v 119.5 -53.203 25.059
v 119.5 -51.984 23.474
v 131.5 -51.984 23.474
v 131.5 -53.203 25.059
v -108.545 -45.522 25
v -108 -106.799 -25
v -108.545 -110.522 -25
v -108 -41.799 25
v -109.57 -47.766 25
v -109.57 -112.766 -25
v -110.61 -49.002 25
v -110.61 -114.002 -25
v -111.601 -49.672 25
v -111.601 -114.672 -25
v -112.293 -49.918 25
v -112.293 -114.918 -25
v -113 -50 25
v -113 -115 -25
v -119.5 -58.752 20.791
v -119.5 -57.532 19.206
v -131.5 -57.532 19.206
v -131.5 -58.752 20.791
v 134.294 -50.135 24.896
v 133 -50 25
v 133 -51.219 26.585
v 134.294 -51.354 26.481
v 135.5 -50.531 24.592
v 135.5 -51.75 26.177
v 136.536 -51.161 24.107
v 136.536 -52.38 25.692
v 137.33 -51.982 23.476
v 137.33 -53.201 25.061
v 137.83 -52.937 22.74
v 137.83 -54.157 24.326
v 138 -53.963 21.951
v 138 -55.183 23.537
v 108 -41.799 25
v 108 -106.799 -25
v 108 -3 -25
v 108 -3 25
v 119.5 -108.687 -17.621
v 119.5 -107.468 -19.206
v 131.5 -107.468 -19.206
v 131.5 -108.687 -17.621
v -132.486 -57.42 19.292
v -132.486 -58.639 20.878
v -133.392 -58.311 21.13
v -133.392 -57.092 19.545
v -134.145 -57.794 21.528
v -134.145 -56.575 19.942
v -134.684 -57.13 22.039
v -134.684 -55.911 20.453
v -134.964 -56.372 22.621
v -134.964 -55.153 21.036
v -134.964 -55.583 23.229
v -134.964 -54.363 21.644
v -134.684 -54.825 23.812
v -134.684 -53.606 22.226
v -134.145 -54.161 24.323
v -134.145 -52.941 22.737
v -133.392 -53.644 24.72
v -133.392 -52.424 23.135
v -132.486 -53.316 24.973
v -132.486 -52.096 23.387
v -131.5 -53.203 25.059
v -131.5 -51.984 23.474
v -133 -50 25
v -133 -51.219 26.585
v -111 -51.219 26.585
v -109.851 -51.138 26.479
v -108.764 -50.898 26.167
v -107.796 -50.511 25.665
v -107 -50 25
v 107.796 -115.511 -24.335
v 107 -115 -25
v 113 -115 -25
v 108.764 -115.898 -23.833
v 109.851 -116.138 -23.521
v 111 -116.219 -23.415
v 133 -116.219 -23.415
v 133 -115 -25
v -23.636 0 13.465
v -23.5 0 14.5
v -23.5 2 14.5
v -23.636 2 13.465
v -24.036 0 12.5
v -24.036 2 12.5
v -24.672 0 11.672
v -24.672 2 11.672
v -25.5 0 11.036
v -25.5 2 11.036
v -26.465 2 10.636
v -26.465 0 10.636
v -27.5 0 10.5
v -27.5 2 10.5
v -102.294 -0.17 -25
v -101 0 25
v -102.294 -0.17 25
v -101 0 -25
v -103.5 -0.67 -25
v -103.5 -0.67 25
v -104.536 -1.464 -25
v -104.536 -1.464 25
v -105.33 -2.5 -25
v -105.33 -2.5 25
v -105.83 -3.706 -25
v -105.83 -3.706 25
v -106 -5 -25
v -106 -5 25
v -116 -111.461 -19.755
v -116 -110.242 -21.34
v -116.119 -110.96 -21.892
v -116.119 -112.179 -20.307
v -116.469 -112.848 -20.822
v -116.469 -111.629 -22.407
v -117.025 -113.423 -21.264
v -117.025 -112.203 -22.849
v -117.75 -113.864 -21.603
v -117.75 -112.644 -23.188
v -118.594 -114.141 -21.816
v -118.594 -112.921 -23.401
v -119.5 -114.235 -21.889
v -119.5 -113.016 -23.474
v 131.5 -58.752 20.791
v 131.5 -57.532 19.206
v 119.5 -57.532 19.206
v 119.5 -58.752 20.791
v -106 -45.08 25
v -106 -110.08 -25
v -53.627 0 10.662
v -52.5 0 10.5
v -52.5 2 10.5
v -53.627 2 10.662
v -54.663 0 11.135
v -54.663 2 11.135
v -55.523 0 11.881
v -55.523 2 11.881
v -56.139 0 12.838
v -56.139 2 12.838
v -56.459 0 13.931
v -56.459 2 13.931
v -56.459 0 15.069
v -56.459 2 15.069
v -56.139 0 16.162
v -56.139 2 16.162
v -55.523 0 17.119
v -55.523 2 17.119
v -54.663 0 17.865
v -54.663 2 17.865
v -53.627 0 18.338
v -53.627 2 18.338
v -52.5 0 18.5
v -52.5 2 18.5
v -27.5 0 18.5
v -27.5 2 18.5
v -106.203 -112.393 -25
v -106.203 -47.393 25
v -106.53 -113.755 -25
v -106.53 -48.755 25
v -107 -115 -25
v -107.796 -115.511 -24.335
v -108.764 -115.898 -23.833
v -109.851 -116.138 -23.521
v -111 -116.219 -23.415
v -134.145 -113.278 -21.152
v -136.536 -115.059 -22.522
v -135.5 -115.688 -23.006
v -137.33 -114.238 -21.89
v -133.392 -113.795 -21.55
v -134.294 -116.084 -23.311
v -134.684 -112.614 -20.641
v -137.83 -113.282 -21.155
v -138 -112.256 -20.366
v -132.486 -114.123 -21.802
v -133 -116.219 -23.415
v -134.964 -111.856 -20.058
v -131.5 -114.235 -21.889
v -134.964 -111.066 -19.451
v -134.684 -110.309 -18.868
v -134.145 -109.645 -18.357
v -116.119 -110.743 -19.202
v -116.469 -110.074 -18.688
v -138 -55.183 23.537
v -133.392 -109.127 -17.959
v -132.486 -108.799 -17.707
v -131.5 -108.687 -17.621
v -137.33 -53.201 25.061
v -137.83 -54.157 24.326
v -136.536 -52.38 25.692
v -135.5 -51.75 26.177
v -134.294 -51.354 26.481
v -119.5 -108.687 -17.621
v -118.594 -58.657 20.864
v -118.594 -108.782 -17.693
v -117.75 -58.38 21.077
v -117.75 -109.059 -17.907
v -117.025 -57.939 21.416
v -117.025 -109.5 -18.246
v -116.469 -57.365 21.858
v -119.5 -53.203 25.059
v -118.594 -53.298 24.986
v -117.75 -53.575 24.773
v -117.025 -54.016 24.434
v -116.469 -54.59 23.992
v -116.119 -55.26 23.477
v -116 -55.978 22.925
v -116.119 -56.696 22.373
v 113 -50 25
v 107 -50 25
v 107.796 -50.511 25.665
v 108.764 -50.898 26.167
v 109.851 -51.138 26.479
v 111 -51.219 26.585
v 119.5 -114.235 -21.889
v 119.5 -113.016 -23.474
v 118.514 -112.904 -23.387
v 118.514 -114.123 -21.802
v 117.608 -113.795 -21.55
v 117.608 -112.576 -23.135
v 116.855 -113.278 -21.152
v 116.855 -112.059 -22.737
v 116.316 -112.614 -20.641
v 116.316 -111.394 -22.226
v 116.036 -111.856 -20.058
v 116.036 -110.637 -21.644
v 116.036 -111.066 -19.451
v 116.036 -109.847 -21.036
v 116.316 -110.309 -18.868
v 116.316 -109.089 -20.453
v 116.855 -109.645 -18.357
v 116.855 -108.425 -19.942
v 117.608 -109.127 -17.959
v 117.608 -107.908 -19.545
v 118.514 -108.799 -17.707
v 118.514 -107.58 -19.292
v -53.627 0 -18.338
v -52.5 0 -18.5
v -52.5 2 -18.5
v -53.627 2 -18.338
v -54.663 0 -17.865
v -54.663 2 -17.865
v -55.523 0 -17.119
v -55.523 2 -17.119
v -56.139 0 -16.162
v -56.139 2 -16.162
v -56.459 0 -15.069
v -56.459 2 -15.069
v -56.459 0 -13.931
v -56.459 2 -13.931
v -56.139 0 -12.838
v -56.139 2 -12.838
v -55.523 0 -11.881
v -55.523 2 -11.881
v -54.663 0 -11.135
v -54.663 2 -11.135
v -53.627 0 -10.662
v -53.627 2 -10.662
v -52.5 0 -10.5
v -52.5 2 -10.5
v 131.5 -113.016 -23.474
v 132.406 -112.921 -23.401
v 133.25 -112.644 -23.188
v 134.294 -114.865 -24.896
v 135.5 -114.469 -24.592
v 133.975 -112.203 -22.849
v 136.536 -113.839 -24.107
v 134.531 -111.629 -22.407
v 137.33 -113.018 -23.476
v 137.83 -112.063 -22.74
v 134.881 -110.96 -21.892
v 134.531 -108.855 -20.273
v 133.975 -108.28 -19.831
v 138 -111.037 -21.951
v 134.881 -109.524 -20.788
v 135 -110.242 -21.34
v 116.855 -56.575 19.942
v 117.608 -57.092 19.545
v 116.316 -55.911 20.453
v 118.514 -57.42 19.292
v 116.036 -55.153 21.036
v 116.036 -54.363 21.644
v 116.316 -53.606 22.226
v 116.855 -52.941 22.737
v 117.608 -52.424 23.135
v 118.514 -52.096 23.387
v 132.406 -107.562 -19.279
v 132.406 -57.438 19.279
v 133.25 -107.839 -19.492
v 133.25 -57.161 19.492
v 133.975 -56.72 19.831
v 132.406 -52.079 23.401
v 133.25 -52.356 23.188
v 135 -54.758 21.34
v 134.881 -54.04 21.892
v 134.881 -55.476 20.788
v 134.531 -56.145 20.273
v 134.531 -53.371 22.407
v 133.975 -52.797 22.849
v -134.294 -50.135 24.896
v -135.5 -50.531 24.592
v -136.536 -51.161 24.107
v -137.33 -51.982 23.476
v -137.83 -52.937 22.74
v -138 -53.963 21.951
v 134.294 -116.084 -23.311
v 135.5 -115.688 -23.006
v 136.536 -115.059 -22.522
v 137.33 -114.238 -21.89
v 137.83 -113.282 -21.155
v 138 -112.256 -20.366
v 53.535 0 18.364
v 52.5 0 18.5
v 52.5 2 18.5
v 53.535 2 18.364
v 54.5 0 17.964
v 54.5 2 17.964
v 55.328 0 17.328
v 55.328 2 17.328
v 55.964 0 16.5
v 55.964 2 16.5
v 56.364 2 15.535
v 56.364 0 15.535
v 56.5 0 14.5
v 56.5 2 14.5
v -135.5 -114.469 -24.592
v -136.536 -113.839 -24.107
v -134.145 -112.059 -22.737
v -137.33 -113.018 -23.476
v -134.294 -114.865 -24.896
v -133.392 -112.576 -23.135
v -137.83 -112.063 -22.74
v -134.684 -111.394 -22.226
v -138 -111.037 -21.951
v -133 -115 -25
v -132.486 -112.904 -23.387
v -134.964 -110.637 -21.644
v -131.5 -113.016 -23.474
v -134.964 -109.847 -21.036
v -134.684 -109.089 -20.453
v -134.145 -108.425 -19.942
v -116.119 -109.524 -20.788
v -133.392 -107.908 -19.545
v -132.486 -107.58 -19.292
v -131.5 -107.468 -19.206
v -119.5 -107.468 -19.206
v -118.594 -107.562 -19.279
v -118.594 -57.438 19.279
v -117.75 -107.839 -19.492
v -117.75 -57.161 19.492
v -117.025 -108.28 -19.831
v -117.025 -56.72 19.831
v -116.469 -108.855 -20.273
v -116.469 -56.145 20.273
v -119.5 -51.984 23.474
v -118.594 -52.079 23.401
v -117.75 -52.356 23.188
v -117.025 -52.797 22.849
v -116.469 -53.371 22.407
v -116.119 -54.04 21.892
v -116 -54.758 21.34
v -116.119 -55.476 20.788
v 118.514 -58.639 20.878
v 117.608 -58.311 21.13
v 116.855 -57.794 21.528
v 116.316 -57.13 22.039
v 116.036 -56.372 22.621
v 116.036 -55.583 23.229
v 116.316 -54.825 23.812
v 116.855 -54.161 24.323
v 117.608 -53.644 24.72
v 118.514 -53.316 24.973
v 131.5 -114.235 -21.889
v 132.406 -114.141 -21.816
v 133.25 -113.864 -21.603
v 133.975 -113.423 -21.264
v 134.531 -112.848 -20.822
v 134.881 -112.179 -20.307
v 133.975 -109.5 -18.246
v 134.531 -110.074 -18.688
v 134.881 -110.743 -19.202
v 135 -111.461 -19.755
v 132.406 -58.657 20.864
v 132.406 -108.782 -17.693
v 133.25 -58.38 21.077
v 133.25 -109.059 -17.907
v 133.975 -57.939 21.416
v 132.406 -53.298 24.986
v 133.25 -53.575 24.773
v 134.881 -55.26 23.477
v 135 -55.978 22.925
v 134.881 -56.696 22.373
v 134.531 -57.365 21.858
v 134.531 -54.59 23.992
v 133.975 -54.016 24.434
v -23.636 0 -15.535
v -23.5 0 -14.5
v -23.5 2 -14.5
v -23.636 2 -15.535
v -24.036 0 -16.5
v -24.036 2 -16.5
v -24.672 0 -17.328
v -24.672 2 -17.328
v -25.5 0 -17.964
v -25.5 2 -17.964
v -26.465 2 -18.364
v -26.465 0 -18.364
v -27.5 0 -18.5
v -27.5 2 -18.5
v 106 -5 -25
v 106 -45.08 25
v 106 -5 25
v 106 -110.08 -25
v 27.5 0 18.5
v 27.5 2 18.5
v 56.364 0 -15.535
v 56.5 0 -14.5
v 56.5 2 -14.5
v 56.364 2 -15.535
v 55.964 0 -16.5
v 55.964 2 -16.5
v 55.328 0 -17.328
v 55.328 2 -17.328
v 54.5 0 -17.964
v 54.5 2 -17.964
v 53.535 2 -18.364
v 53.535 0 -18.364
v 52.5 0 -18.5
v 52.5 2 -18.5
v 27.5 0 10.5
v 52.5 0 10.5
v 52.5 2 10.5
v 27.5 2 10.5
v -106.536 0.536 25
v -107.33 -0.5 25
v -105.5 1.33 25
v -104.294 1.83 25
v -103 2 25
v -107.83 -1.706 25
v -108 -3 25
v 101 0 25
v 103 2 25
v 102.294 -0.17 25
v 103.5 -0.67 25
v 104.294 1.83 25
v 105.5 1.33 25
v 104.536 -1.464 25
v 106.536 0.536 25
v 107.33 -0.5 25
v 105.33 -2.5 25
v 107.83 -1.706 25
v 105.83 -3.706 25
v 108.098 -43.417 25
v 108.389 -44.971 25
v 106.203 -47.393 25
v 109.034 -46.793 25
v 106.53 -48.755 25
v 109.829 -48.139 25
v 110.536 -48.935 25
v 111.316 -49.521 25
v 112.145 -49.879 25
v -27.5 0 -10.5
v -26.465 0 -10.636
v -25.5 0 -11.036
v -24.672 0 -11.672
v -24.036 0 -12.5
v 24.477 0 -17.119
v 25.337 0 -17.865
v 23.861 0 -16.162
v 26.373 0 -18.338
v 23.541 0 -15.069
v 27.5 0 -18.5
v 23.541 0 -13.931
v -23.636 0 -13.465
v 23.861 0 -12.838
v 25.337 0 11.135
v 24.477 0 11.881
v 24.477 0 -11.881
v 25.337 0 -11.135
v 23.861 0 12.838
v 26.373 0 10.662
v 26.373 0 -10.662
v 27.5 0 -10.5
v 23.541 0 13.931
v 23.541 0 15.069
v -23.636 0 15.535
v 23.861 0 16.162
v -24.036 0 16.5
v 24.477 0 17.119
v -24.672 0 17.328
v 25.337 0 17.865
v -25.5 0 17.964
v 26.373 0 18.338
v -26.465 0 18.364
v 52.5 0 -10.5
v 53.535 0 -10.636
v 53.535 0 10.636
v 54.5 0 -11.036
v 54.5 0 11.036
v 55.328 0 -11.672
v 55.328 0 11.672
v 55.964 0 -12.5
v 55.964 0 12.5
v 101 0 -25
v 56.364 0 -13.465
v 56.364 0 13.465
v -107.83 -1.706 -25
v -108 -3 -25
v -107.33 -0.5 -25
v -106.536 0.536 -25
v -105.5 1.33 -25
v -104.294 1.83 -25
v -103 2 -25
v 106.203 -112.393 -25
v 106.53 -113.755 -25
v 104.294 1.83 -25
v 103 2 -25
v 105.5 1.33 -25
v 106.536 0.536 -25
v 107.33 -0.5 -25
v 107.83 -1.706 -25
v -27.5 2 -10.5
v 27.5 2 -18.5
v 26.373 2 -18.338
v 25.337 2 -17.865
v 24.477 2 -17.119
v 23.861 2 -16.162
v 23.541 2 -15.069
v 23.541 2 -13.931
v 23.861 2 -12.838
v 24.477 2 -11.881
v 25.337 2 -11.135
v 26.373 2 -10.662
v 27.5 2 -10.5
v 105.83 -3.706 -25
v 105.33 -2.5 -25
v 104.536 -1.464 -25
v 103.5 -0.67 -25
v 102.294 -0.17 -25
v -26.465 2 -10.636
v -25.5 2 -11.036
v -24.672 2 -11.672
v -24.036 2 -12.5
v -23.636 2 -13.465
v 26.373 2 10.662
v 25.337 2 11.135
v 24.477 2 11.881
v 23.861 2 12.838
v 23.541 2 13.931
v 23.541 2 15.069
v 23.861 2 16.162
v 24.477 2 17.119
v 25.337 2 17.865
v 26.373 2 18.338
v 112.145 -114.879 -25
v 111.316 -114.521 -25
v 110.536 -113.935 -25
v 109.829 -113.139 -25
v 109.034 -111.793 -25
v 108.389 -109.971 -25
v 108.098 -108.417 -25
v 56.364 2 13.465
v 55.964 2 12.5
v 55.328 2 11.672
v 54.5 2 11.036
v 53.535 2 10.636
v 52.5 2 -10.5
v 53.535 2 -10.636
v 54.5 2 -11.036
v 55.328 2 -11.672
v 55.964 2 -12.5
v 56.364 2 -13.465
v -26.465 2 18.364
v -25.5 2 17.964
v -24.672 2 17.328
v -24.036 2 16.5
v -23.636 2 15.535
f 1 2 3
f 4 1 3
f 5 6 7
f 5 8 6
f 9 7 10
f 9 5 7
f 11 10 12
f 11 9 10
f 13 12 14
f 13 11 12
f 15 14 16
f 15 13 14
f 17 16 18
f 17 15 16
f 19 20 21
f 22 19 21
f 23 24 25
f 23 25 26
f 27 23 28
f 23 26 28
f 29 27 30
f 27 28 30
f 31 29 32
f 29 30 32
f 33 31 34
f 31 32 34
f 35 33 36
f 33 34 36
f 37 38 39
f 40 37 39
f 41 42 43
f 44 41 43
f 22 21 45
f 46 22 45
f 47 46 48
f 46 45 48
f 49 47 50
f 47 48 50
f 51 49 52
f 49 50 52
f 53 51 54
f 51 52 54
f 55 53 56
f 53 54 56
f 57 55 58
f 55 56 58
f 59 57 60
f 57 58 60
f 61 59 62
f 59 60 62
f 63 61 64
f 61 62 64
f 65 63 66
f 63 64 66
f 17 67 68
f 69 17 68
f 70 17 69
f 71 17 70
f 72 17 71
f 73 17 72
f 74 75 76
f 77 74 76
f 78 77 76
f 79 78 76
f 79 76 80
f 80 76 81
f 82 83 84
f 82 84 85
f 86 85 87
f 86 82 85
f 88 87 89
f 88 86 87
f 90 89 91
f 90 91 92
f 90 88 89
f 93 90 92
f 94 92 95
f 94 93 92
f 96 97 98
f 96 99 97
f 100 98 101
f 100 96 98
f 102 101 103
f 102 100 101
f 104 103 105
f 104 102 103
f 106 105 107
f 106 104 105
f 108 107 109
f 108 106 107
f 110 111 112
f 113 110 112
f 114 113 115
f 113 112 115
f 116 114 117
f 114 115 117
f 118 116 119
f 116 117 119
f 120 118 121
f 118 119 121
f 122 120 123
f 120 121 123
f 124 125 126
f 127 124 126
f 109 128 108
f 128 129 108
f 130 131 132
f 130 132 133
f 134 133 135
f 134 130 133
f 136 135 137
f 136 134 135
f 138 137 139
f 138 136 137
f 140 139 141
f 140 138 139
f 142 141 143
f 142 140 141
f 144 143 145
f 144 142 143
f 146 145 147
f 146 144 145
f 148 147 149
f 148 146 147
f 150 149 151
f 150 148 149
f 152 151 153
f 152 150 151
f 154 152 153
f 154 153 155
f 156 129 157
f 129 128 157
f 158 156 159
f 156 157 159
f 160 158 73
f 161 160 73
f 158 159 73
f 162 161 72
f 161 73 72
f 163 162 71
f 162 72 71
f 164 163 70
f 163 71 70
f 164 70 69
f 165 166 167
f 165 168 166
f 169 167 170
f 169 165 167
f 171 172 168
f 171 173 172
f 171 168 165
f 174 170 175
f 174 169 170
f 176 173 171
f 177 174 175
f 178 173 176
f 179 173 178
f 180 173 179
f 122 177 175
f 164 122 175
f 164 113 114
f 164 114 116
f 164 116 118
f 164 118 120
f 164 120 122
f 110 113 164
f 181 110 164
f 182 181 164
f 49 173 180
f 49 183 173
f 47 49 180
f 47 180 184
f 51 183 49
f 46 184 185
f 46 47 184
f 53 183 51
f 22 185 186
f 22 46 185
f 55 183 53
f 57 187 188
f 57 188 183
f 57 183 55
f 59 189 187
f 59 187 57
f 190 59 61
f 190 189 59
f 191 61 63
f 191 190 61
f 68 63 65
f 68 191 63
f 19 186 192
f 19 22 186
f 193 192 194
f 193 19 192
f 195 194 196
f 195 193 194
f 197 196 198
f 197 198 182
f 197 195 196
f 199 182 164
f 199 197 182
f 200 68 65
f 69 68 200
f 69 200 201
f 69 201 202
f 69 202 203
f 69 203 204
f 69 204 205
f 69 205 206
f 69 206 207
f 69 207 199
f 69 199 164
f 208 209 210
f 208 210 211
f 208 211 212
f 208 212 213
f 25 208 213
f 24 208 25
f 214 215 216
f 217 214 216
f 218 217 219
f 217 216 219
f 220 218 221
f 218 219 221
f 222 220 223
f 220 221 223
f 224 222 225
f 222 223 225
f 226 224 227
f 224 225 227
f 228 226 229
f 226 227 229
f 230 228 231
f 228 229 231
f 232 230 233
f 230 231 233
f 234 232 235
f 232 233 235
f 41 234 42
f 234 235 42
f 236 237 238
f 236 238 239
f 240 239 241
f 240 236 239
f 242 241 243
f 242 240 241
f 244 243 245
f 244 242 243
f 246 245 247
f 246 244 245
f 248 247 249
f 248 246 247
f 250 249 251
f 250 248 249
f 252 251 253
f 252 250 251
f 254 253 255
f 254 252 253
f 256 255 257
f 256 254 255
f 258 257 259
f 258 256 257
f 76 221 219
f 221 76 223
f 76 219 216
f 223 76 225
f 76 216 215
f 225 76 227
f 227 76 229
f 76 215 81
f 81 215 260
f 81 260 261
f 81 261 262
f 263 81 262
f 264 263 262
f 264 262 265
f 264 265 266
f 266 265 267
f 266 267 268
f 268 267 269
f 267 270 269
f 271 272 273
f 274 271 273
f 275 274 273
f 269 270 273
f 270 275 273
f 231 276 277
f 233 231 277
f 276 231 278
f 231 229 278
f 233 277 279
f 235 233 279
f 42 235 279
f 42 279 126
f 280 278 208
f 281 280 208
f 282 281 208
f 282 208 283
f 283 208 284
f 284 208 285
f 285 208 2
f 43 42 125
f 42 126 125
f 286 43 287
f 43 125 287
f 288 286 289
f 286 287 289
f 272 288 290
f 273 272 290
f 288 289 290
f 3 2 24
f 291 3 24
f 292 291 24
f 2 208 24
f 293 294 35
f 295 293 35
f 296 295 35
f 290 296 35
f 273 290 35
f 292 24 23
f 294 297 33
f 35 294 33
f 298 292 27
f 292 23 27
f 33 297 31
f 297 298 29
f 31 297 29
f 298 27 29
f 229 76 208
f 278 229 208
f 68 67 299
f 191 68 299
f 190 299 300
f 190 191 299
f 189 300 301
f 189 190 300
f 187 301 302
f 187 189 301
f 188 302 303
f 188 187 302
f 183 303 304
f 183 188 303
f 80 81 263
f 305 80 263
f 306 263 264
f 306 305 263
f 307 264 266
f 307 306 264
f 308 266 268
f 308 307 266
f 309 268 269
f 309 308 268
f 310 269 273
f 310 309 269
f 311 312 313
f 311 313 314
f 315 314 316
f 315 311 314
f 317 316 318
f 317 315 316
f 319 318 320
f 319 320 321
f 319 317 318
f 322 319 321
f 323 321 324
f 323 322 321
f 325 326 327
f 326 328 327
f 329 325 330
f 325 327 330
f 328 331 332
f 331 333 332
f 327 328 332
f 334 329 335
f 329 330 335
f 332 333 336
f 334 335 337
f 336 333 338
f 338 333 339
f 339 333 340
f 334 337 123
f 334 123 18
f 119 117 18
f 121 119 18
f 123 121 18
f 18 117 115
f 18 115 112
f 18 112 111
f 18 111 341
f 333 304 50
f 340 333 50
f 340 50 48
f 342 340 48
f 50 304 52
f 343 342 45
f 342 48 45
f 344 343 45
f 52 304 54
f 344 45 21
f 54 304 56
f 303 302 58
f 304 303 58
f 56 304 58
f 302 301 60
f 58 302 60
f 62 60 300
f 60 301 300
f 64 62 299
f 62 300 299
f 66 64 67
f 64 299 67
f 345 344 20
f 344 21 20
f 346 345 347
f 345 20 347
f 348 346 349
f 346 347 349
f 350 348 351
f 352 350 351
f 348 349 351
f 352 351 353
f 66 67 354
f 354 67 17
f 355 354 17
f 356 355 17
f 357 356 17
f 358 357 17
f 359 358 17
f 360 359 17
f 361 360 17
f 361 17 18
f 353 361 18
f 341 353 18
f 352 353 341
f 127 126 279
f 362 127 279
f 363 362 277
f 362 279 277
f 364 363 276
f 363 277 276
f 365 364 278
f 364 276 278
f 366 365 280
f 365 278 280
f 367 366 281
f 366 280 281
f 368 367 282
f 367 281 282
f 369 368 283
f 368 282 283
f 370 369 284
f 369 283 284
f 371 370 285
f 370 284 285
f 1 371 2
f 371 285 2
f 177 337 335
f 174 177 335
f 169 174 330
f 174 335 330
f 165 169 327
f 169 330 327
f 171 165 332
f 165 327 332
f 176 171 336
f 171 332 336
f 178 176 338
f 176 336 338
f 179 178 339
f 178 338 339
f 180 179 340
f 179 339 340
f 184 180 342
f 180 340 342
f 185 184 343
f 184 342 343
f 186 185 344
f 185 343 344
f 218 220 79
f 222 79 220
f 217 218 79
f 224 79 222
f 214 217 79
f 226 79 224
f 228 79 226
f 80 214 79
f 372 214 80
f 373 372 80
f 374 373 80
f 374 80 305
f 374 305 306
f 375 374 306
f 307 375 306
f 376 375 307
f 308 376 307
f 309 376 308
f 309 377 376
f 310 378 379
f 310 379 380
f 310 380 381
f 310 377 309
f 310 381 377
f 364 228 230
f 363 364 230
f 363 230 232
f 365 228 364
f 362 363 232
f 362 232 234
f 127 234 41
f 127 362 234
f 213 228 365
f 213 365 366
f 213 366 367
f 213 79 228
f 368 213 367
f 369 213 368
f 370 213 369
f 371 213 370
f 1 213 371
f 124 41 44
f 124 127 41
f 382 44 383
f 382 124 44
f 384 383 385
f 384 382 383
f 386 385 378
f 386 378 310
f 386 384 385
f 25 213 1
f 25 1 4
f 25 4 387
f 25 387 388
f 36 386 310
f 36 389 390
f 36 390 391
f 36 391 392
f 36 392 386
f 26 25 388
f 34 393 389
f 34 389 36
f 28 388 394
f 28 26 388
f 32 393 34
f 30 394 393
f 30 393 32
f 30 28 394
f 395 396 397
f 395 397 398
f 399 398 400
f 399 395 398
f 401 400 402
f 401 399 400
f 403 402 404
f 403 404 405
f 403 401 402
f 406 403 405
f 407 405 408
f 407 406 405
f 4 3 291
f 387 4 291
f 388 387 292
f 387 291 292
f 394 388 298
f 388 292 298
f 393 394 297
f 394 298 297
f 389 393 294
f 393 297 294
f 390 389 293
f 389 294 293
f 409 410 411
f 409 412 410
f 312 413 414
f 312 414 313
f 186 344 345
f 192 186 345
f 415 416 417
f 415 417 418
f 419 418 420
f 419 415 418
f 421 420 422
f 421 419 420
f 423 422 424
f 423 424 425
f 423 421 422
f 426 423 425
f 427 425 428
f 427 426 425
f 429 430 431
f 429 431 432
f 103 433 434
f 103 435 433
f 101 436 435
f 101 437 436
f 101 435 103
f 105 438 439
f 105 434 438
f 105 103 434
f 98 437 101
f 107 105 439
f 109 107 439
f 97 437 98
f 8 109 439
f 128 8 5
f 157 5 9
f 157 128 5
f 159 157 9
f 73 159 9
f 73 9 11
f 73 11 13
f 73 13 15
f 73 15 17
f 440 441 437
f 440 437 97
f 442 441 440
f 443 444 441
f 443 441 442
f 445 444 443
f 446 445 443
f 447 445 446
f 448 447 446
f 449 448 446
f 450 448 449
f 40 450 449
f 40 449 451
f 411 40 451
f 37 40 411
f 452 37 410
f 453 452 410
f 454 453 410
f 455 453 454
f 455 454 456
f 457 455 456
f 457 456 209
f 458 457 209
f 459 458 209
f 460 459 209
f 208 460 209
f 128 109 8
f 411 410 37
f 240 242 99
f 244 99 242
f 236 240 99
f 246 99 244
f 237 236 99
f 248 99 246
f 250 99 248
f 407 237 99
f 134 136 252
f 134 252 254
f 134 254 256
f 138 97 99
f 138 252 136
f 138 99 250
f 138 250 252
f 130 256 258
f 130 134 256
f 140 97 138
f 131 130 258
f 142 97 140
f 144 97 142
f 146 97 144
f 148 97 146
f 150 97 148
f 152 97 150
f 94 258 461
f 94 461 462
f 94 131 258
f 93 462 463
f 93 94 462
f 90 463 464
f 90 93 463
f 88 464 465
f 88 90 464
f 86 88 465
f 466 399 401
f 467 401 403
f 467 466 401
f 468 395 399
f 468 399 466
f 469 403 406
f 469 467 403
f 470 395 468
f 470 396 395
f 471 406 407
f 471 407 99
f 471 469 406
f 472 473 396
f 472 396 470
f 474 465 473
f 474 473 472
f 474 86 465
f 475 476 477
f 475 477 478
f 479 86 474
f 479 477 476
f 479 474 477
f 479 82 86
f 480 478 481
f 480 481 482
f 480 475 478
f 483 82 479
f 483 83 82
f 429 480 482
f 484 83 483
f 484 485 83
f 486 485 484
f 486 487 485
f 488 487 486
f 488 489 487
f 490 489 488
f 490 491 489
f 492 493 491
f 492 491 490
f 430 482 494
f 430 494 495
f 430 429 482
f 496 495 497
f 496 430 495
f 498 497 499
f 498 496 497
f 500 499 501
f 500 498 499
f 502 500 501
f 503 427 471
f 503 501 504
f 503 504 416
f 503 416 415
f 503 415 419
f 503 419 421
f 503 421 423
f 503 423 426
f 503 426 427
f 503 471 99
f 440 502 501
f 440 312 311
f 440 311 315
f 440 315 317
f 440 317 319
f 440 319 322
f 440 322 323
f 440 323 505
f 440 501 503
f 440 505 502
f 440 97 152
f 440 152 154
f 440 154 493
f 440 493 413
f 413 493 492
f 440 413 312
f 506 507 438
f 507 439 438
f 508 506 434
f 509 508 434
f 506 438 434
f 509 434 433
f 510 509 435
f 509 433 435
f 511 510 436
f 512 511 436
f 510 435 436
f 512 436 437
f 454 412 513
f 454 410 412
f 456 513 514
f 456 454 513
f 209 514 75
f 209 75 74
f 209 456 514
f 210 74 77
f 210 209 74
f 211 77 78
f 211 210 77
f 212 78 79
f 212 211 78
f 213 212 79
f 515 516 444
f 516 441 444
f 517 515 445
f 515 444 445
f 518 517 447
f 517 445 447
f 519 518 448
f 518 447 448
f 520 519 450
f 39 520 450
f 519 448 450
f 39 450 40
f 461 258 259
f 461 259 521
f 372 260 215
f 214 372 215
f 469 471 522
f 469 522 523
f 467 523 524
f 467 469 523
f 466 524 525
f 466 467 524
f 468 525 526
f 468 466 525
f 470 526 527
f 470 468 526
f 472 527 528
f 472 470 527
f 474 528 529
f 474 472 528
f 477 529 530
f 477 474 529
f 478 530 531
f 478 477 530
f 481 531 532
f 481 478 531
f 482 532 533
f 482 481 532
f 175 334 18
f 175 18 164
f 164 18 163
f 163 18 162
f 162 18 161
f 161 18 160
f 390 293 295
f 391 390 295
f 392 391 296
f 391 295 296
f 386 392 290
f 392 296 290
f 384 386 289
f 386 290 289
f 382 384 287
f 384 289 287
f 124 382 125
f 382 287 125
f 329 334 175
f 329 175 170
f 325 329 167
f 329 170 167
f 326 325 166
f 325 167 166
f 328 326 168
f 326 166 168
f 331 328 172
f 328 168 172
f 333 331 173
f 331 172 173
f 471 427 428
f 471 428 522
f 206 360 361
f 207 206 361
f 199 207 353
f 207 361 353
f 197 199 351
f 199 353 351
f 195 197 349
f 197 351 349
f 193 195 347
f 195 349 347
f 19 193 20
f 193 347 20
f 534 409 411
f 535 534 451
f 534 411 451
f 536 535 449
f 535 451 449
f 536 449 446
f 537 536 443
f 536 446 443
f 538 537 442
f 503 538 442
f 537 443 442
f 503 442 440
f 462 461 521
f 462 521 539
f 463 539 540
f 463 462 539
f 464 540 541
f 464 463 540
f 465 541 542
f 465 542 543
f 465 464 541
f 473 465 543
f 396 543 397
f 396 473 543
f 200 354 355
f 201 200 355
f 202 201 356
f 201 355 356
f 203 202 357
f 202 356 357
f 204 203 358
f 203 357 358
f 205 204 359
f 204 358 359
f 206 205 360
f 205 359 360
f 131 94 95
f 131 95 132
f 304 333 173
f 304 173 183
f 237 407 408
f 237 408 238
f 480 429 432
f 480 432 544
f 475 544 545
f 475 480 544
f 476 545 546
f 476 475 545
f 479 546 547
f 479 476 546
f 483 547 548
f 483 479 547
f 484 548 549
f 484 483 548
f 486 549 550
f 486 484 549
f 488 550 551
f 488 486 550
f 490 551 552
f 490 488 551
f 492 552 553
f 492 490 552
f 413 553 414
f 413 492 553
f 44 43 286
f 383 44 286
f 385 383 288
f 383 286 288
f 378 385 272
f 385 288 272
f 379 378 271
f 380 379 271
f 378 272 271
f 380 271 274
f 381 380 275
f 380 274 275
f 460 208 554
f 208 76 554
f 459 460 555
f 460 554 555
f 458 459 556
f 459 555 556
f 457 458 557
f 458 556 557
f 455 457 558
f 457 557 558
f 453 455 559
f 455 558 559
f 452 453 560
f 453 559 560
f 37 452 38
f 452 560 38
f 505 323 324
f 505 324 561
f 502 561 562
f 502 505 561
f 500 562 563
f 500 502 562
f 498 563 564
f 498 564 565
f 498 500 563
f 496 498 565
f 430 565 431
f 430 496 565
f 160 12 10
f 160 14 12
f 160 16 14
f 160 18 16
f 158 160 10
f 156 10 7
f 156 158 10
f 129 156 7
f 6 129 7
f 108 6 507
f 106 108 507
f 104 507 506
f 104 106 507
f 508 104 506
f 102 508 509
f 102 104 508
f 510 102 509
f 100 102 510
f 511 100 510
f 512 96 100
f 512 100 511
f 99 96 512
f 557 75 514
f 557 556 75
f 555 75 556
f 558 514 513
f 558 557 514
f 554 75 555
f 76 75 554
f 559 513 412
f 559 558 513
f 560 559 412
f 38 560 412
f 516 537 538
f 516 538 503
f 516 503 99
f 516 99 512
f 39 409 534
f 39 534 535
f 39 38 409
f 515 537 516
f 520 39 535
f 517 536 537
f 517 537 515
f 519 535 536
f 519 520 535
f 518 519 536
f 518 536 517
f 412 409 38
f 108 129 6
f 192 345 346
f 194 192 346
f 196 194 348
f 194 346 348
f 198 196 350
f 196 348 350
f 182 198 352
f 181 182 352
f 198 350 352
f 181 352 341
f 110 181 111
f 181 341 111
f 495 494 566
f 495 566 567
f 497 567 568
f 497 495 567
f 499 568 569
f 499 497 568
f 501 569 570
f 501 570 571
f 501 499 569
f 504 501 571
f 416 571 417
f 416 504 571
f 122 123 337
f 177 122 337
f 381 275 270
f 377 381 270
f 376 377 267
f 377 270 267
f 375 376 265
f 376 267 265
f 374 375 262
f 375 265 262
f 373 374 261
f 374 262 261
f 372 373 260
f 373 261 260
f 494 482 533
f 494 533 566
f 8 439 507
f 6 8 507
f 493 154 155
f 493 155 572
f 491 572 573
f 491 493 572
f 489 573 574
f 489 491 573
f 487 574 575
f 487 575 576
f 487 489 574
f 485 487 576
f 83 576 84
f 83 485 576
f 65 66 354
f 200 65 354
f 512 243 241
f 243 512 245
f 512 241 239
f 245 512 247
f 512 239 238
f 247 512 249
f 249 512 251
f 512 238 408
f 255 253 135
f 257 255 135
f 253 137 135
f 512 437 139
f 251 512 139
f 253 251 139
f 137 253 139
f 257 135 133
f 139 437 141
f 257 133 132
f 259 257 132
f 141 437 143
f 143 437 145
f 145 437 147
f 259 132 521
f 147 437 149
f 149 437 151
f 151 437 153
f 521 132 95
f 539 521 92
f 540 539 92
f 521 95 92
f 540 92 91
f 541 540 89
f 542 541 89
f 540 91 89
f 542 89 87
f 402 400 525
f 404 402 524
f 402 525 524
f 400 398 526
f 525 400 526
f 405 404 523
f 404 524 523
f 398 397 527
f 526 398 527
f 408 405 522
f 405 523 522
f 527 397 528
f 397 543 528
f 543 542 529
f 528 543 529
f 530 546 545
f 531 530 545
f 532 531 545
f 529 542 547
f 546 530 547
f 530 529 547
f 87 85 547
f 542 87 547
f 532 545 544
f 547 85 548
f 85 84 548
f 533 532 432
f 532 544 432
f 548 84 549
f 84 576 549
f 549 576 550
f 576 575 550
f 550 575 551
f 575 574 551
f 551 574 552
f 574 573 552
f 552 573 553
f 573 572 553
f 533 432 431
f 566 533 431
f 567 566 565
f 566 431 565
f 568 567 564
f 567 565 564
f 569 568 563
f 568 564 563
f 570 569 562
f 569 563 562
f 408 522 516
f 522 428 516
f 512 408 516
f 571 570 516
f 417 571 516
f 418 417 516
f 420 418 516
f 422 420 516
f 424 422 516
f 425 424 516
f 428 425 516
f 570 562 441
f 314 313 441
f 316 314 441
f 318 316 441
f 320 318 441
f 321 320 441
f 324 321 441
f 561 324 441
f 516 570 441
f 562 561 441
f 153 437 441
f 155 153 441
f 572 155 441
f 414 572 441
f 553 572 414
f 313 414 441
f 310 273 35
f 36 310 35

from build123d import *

# Parameters (mm, degrees)
F0_W     = 216
F0_H     = 50
F1_DEPTH = 2
F3_DEPTH = 2
F4_W     = 32
F4_H     = 82.0060973343
F5_DEPTH = 2
F7_DEPTH = 2
F8_W     = 32
F8_H     = 82.0060973343
F9_DEPTH = 2
F10_R    = 5


# Not quite as in the source:
# - a feature names something its author has since deleted; it is built from what else it names


with BuildPart() as f1:
    # F0 (on Front) → F1 (new body)
    with BuildSketch(Plane.XZ):
        Rectangle(F0_W, F0_H)
        with BuildLine():
            ThreePointArc((-27.5, -10.5), (-24.6715728753, -11.6715728753), (-23.5, -14.5))
            ThreePointArc((-23.5, -14.5), (-24.6715728753, -17.3284271247), (-27.5, -18.5))
            Line((-27.5, -18.5), (-52.5, -18.5))
            ThreePointArc((-52.5, -18.5), (-56.5, -14.5), (-52.5, -10.5))
            Line((-52.5, -10.5), (-27.5, -10.5))
        make_face(mode=Mode.SUBTRACT)
        with BuildLine():
            ThreePointArc((27.5, -18.5), (23.5, -14.5), (27.5, -10.5))
            Line((27.5, -10.5), (52.5, -10.5))
            ThreePointArc((52.5, -10.5), (55.3284271247, -11.6715728753), (56.5, -14.5))
            ThreePointArc((56.5, -14.5), (55.3284271247, -17.3284271247), (52.5, -18.5))
            Line((52.5, -18.5), (27.5, -18.5))
        make_face(mode=Mode.SUBTRACT)
        with BuildLine():
            ThreePointArc((-52.5, 10.5), (-56.5, 14.5), (-52.5, 18.5))
            Line((-52.5, 18.5), (-27.5, 18.5))
            ThreePointArc((-27.5, 18.5), (-24.6715728753, 17.3284271247), (-23.5, 14.5))
            ThreePointArc((-23.5, 14.5), (-24.6715728753, 11.6715728753), (-27.5, 10.5))
            Line((-27.5, 10.5), (-52.5, 10.5))
        make_face(mode=Mode.SUBTRACT)
        with BuildLine():
            ThreePointArc((27.5, 10.5), (23.5, 14.5), (27.5, 18.5))
            Line((27.5, 18.5), (52.5, 18.5))
            ThreePointArc((52.5, 18.5), (55.3284271247, 17.3284271247), (56.5, 14.5))
            ThreePointArc((56.5, 14.5), (55.3284271247, 11.6715728753), (52.5, 10.5))
            Line((52.5, 10.5), (27.5, 10.5))
        make_face(mode=Mode.SUBTRACT)
    extrude(amount=-F1_DEPTH)

    # F2 (on face) → F3 (join)
    with BuildSketch(Plane(origin=(-108, 0, 0), x_dir=(0, -1, 0), z_dir=(-1, 0, 0))):
        Polygon((0, 25), (0, -25), (115, -25), (50, 25), align=None)
    extrude(amount=-F3_DEPTH)

    # F4 (on face) → F5 (join)
    with BuildSketch(Plane(origin=(0, -30.6691449814, 39.8698884758), x_dir=(1, 0, 0), z_dir=(0, -0.6097107608, 0.7926239891))):
        with Locations((-122, -65.3914791011)):
            Rectangle(F4_W, F4_H)
        with BuildLine():
            ThreePointArc((-119.5, -96.8914791011), (-117.0251262658, -97.916605367), (-116, -100.3914791011))
            ThreePointArc((-116, -100.3914791011), (-117.0251262658, -102.8663528353), (-119.5, -103.8914791011))
            Line((-119.5, -103.8914791011), (-131.5, -103.8914791011))
            ThreePointArc((-131.5, -103.8914791011), (-135, -100.3914791011), (-131.5, -96.8914791011))
            Line((-131.5, -96.8914791011), (-119.5, -96.8914791011))
        make_face(mode=Mode.SUBTRACT)
        with BuildLine():
            ThreePointArc((-131.5, -33.8914791011), (-135, -30.3914791011), (-131.5, -26.8914791011))
            Line((-131.5, -26.8914791011), (-119.5, -26.8914791011))
            ThreePointArc((-119.5, -26.8914791011), (-117.0251262658, -27.916605367), (-116, -30.3914791011))
            ThreePointArc((-116, -30.3914791011), (-117.0251262658, -32.8663528353), (-119.5, -33.8914791011))
            Line((-119.5, -33.8914791011), (-131.5, -33.8914791011))
        make_face(mode=Mode.SUBTRACT)
    extrude(amount=F5_DEPTH)

    # F6 (on face) → F7 (join)
    with BuildSketch(Plane.YZ.offset(108)):
        Polygon((0, -25), (0, 25), (-50, 25), (-115, -25), align=None)
    extrude(amount=-F7_DEPTH)

    # F8 (on face) → F9 (join)
    with BuildSketch(Plane(origin=(0, -30.6691449814, 39.8698884758), x_dir=(1, 0, 0), z_dir=(0, -0.6097107608, 0.7926239891))):
        with Locations((122, -65.3914791011)):
            Rectangle(F8_W, F8_H)
        with BuildLine():
            ThreePointArc((131.5, -96.8914791011), (133.9748737342, -97.916605367), (135, -100.3914791011))
            ThreePointArc((135, -100.3914791011), (133.9748737342, -102.8663528353), (131.5, -103.8914791011))
            Line((131.5, -103.8914791011), (119.5, -103.8914791011))
            ThreePointArc((119.5, -103.8914791011), (116, -100.3914791011), (119.5, -96.8914791011))
            Line((119.5, -96.8914791011), (131.5, -96.8914791011))
        make_face(mode=Mode.SUBTRACT)
        with BuildLine():
            ThreePointArc((119.5, -33.8914791011), (116, -30.3914791011), (119.5, -26.8914791011))
            Line((119.5, -26.8914791011), (131.5, -26.8914791011))
            ThreePointArc((131.5, -26.8914791011), (133.9748737342, -27.916605367), (135, -30.3914791011))
            ThreePointArc((135, -30.3914791011), (133.9748737342, -32.8663528353), (131.5, -33.8914791011))
            Line((131.5, -33.8914791011), (119.5, -33.8914791011))
        make_face(mode=Mode.SUBTRACT)
    extrude(amount=F9_DEPTH)

    # F10
    f10_edges = [f1.edges().sort_by_distance(p)[0] for p in [
        (-106, -83.719422, 1.585248),
        (-108, -82.5, 0),
        (-108, 2, 0),
        (-106, 0, 0),
        (106, 0, 0),
        (108, 2, 0),
        (108, -82.5, 0),
        (-138, -115.609711, -24.207376),
        (-138, -50.609711, 25.792624),
        (106, -83.719422, 1.585248),
        (138, -50.609711, 25.792624),
        (138, -115.609711, -24.207376),
    ]]
    fillet(f10_edges, radius=F10_R)


solid = f1.part
